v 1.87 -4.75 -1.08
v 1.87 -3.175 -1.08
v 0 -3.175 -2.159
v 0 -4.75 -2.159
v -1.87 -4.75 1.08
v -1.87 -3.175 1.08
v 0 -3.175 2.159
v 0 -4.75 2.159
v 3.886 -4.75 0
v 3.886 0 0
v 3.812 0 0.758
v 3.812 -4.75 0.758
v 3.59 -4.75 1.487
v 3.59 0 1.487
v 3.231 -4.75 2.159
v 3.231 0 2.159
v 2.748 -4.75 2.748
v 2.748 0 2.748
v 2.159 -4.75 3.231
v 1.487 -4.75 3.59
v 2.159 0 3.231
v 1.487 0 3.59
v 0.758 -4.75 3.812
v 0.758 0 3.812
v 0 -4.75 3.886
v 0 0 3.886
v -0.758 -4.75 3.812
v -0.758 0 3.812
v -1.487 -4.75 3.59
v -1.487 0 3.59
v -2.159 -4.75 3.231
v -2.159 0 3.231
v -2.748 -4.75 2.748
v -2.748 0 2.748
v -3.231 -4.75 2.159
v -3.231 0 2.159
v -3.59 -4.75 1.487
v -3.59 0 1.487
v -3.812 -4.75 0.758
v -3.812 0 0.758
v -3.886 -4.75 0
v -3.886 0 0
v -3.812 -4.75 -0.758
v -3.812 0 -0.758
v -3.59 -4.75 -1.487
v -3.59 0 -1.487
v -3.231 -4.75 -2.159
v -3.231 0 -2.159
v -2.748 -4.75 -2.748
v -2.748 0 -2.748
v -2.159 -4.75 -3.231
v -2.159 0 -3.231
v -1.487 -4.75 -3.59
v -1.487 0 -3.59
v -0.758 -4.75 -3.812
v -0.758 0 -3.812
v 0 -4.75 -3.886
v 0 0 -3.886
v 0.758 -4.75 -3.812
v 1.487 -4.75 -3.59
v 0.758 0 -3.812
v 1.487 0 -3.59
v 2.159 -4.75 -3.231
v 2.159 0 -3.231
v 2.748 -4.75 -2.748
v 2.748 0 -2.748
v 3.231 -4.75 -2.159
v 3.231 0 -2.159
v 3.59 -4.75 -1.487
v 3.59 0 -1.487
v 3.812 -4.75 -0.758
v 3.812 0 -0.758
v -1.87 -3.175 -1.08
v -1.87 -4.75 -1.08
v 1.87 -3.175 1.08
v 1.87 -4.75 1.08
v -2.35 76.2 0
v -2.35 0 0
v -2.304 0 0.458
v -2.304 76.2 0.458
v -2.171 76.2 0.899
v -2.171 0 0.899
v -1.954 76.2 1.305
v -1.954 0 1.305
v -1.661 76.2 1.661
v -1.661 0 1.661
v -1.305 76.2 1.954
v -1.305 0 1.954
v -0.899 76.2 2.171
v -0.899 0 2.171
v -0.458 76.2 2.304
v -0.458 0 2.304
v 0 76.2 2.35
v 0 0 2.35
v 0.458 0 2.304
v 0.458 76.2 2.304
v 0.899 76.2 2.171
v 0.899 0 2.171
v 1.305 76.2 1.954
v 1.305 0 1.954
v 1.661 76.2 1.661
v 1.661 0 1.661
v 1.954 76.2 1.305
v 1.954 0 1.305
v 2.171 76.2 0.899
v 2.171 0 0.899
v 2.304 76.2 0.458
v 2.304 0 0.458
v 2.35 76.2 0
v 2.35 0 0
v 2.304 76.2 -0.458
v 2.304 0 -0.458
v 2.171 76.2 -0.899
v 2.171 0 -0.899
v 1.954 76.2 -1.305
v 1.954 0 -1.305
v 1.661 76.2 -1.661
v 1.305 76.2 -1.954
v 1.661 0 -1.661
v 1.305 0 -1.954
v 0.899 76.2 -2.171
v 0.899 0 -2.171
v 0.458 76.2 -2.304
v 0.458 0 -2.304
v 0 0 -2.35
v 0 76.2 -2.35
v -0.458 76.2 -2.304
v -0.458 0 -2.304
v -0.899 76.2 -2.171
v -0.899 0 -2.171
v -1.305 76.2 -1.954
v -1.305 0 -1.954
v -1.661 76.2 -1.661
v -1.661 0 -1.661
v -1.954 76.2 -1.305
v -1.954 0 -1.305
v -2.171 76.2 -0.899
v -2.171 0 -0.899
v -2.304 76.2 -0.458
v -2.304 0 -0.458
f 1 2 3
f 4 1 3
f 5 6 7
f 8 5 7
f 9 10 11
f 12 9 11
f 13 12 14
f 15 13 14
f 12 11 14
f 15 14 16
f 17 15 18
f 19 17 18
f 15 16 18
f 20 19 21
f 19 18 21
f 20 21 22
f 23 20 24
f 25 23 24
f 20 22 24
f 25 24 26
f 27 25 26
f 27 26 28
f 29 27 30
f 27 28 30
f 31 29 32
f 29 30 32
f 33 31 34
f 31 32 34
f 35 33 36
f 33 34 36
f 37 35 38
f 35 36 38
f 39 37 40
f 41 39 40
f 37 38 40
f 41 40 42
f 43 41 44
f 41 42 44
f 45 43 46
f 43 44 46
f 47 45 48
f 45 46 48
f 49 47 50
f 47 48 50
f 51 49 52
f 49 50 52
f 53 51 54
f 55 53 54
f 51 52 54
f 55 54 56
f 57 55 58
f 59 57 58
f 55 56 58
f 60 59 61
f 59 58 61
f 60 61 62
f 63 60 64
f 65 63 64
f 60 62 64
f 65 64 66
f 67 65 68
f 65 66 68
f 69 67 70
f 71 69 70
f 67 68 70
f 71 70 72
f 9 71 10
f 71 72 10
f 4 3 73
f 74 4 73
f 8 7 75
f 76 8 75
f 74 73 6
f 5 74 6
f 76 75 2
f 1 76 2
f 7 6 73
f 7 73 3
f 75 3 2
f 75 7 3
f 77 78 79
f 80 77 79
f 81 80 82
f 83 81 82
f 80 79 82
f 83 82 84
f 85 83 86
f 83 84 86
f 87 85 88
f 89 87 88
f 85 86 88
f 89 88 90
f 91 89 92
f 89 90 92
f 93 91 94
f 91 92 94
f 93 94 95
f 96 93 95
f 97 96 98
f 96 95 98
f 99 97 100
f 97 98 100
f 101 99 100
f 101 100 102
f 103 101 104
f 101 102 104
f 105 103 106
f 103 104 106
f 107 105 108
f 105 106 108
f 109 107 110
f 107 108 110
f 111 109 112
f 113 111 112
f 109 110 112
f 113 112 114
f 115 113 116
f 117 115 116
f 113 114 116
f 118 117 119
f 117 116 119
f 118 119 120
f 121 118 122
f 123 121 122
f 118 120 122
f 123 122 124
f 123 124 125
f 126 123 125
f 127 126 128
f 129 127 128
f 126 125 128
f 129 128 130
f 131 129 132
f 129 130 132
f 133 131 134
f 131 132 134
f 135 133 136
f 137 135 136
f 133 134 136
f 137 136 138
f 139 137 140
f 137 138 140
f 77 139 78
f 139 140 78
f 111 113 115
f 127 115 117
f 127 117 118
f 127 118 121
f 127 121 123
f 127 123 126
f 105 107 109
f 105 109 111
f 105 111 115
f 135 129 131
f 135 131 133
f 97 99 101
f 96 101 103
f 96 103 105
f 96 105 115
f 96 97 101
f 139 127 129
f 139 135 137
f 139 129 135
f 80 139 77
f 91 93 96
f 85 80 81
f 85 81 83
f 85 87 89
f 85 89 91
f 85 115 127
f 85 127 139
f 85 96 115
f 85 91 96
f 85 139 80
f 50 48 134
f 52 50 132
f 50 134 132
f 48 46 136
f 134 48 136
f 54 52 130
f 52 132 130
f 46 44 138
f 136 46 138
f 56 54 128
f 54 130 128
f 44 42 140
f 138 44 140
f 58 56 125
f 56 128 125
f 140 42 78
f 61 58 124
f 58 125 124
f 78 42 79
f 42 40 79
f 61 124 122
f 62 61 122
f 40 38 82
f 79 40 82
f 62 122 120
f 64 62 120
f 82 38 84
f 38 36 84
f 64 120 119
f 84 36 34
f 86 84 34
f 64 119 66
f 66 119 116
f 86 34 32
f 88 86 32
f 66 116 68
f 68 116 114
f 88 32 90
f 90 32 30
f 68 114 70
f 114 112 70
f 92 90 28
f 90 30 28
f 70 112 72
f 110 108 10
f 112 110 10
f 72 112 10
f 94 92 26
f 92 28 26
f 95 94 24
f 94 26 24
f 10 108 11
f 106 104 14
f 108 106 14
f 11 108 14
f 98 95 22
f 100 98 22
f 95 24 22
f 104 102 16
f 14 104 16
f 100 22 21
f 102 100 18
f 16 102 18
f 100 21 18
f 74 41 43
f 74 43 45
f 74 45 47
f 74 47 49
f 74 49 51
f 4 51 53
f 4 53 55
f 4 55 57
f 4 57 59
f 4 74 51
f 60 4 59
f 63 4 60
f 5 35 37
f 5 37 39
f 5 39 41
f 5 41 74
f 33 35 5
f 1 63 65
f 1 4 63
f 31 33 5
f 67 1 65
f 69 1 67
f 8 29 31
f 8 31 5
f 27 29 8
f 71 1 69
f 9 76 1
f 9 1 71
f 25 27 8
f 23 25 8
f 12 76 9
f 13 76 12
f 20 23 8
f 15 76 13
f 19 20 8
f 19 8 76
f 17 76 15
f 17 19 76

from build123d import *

# Parameters (mm, degrees)
F1_DEPTH = 3.175
F0_R     = 3.8862
F2_DEPTH = 4.7498
F3_R     = 2.3495
F4_DEPTH = 76.2


with BuildPart() as f1:
    # F0 (on Front) → F1 (new body)
    with BuildSketch(Plane.XZ):
        Polygon((1.869749, -1.0795), (1.869749, 1.0795), (0, 2.159), (-1.869749, 1.0795), (-1.869749, -1.0795), (0, -2.159), align=None)
    extrude(amount=F1_DEPTH)

    # F0 (on Front) → F2 (join)
    with BuildSketch(Plane.XZ):
        Circle(F0_R)
        Polygon((0, 2.159), (1.869749, 1.0795), (1.869749, -1.0795), (0, -2.159), (-1.869749, -1.0795), (-1.869749, 1.0795), align=None, mode=Mode.SUBTRACT)
    extrude(amount=F2_DEPTH)

    # F3 (on face) → F4 (join)
    with BuildSketch(Plane(origin=(0, 0, 0), x_dir=(-1, 0, 0), z_dir=(0, 1, 0))):
        Circle(F3_R)
    extrude(amount=F4_DEPTH)


solid = f1.part
